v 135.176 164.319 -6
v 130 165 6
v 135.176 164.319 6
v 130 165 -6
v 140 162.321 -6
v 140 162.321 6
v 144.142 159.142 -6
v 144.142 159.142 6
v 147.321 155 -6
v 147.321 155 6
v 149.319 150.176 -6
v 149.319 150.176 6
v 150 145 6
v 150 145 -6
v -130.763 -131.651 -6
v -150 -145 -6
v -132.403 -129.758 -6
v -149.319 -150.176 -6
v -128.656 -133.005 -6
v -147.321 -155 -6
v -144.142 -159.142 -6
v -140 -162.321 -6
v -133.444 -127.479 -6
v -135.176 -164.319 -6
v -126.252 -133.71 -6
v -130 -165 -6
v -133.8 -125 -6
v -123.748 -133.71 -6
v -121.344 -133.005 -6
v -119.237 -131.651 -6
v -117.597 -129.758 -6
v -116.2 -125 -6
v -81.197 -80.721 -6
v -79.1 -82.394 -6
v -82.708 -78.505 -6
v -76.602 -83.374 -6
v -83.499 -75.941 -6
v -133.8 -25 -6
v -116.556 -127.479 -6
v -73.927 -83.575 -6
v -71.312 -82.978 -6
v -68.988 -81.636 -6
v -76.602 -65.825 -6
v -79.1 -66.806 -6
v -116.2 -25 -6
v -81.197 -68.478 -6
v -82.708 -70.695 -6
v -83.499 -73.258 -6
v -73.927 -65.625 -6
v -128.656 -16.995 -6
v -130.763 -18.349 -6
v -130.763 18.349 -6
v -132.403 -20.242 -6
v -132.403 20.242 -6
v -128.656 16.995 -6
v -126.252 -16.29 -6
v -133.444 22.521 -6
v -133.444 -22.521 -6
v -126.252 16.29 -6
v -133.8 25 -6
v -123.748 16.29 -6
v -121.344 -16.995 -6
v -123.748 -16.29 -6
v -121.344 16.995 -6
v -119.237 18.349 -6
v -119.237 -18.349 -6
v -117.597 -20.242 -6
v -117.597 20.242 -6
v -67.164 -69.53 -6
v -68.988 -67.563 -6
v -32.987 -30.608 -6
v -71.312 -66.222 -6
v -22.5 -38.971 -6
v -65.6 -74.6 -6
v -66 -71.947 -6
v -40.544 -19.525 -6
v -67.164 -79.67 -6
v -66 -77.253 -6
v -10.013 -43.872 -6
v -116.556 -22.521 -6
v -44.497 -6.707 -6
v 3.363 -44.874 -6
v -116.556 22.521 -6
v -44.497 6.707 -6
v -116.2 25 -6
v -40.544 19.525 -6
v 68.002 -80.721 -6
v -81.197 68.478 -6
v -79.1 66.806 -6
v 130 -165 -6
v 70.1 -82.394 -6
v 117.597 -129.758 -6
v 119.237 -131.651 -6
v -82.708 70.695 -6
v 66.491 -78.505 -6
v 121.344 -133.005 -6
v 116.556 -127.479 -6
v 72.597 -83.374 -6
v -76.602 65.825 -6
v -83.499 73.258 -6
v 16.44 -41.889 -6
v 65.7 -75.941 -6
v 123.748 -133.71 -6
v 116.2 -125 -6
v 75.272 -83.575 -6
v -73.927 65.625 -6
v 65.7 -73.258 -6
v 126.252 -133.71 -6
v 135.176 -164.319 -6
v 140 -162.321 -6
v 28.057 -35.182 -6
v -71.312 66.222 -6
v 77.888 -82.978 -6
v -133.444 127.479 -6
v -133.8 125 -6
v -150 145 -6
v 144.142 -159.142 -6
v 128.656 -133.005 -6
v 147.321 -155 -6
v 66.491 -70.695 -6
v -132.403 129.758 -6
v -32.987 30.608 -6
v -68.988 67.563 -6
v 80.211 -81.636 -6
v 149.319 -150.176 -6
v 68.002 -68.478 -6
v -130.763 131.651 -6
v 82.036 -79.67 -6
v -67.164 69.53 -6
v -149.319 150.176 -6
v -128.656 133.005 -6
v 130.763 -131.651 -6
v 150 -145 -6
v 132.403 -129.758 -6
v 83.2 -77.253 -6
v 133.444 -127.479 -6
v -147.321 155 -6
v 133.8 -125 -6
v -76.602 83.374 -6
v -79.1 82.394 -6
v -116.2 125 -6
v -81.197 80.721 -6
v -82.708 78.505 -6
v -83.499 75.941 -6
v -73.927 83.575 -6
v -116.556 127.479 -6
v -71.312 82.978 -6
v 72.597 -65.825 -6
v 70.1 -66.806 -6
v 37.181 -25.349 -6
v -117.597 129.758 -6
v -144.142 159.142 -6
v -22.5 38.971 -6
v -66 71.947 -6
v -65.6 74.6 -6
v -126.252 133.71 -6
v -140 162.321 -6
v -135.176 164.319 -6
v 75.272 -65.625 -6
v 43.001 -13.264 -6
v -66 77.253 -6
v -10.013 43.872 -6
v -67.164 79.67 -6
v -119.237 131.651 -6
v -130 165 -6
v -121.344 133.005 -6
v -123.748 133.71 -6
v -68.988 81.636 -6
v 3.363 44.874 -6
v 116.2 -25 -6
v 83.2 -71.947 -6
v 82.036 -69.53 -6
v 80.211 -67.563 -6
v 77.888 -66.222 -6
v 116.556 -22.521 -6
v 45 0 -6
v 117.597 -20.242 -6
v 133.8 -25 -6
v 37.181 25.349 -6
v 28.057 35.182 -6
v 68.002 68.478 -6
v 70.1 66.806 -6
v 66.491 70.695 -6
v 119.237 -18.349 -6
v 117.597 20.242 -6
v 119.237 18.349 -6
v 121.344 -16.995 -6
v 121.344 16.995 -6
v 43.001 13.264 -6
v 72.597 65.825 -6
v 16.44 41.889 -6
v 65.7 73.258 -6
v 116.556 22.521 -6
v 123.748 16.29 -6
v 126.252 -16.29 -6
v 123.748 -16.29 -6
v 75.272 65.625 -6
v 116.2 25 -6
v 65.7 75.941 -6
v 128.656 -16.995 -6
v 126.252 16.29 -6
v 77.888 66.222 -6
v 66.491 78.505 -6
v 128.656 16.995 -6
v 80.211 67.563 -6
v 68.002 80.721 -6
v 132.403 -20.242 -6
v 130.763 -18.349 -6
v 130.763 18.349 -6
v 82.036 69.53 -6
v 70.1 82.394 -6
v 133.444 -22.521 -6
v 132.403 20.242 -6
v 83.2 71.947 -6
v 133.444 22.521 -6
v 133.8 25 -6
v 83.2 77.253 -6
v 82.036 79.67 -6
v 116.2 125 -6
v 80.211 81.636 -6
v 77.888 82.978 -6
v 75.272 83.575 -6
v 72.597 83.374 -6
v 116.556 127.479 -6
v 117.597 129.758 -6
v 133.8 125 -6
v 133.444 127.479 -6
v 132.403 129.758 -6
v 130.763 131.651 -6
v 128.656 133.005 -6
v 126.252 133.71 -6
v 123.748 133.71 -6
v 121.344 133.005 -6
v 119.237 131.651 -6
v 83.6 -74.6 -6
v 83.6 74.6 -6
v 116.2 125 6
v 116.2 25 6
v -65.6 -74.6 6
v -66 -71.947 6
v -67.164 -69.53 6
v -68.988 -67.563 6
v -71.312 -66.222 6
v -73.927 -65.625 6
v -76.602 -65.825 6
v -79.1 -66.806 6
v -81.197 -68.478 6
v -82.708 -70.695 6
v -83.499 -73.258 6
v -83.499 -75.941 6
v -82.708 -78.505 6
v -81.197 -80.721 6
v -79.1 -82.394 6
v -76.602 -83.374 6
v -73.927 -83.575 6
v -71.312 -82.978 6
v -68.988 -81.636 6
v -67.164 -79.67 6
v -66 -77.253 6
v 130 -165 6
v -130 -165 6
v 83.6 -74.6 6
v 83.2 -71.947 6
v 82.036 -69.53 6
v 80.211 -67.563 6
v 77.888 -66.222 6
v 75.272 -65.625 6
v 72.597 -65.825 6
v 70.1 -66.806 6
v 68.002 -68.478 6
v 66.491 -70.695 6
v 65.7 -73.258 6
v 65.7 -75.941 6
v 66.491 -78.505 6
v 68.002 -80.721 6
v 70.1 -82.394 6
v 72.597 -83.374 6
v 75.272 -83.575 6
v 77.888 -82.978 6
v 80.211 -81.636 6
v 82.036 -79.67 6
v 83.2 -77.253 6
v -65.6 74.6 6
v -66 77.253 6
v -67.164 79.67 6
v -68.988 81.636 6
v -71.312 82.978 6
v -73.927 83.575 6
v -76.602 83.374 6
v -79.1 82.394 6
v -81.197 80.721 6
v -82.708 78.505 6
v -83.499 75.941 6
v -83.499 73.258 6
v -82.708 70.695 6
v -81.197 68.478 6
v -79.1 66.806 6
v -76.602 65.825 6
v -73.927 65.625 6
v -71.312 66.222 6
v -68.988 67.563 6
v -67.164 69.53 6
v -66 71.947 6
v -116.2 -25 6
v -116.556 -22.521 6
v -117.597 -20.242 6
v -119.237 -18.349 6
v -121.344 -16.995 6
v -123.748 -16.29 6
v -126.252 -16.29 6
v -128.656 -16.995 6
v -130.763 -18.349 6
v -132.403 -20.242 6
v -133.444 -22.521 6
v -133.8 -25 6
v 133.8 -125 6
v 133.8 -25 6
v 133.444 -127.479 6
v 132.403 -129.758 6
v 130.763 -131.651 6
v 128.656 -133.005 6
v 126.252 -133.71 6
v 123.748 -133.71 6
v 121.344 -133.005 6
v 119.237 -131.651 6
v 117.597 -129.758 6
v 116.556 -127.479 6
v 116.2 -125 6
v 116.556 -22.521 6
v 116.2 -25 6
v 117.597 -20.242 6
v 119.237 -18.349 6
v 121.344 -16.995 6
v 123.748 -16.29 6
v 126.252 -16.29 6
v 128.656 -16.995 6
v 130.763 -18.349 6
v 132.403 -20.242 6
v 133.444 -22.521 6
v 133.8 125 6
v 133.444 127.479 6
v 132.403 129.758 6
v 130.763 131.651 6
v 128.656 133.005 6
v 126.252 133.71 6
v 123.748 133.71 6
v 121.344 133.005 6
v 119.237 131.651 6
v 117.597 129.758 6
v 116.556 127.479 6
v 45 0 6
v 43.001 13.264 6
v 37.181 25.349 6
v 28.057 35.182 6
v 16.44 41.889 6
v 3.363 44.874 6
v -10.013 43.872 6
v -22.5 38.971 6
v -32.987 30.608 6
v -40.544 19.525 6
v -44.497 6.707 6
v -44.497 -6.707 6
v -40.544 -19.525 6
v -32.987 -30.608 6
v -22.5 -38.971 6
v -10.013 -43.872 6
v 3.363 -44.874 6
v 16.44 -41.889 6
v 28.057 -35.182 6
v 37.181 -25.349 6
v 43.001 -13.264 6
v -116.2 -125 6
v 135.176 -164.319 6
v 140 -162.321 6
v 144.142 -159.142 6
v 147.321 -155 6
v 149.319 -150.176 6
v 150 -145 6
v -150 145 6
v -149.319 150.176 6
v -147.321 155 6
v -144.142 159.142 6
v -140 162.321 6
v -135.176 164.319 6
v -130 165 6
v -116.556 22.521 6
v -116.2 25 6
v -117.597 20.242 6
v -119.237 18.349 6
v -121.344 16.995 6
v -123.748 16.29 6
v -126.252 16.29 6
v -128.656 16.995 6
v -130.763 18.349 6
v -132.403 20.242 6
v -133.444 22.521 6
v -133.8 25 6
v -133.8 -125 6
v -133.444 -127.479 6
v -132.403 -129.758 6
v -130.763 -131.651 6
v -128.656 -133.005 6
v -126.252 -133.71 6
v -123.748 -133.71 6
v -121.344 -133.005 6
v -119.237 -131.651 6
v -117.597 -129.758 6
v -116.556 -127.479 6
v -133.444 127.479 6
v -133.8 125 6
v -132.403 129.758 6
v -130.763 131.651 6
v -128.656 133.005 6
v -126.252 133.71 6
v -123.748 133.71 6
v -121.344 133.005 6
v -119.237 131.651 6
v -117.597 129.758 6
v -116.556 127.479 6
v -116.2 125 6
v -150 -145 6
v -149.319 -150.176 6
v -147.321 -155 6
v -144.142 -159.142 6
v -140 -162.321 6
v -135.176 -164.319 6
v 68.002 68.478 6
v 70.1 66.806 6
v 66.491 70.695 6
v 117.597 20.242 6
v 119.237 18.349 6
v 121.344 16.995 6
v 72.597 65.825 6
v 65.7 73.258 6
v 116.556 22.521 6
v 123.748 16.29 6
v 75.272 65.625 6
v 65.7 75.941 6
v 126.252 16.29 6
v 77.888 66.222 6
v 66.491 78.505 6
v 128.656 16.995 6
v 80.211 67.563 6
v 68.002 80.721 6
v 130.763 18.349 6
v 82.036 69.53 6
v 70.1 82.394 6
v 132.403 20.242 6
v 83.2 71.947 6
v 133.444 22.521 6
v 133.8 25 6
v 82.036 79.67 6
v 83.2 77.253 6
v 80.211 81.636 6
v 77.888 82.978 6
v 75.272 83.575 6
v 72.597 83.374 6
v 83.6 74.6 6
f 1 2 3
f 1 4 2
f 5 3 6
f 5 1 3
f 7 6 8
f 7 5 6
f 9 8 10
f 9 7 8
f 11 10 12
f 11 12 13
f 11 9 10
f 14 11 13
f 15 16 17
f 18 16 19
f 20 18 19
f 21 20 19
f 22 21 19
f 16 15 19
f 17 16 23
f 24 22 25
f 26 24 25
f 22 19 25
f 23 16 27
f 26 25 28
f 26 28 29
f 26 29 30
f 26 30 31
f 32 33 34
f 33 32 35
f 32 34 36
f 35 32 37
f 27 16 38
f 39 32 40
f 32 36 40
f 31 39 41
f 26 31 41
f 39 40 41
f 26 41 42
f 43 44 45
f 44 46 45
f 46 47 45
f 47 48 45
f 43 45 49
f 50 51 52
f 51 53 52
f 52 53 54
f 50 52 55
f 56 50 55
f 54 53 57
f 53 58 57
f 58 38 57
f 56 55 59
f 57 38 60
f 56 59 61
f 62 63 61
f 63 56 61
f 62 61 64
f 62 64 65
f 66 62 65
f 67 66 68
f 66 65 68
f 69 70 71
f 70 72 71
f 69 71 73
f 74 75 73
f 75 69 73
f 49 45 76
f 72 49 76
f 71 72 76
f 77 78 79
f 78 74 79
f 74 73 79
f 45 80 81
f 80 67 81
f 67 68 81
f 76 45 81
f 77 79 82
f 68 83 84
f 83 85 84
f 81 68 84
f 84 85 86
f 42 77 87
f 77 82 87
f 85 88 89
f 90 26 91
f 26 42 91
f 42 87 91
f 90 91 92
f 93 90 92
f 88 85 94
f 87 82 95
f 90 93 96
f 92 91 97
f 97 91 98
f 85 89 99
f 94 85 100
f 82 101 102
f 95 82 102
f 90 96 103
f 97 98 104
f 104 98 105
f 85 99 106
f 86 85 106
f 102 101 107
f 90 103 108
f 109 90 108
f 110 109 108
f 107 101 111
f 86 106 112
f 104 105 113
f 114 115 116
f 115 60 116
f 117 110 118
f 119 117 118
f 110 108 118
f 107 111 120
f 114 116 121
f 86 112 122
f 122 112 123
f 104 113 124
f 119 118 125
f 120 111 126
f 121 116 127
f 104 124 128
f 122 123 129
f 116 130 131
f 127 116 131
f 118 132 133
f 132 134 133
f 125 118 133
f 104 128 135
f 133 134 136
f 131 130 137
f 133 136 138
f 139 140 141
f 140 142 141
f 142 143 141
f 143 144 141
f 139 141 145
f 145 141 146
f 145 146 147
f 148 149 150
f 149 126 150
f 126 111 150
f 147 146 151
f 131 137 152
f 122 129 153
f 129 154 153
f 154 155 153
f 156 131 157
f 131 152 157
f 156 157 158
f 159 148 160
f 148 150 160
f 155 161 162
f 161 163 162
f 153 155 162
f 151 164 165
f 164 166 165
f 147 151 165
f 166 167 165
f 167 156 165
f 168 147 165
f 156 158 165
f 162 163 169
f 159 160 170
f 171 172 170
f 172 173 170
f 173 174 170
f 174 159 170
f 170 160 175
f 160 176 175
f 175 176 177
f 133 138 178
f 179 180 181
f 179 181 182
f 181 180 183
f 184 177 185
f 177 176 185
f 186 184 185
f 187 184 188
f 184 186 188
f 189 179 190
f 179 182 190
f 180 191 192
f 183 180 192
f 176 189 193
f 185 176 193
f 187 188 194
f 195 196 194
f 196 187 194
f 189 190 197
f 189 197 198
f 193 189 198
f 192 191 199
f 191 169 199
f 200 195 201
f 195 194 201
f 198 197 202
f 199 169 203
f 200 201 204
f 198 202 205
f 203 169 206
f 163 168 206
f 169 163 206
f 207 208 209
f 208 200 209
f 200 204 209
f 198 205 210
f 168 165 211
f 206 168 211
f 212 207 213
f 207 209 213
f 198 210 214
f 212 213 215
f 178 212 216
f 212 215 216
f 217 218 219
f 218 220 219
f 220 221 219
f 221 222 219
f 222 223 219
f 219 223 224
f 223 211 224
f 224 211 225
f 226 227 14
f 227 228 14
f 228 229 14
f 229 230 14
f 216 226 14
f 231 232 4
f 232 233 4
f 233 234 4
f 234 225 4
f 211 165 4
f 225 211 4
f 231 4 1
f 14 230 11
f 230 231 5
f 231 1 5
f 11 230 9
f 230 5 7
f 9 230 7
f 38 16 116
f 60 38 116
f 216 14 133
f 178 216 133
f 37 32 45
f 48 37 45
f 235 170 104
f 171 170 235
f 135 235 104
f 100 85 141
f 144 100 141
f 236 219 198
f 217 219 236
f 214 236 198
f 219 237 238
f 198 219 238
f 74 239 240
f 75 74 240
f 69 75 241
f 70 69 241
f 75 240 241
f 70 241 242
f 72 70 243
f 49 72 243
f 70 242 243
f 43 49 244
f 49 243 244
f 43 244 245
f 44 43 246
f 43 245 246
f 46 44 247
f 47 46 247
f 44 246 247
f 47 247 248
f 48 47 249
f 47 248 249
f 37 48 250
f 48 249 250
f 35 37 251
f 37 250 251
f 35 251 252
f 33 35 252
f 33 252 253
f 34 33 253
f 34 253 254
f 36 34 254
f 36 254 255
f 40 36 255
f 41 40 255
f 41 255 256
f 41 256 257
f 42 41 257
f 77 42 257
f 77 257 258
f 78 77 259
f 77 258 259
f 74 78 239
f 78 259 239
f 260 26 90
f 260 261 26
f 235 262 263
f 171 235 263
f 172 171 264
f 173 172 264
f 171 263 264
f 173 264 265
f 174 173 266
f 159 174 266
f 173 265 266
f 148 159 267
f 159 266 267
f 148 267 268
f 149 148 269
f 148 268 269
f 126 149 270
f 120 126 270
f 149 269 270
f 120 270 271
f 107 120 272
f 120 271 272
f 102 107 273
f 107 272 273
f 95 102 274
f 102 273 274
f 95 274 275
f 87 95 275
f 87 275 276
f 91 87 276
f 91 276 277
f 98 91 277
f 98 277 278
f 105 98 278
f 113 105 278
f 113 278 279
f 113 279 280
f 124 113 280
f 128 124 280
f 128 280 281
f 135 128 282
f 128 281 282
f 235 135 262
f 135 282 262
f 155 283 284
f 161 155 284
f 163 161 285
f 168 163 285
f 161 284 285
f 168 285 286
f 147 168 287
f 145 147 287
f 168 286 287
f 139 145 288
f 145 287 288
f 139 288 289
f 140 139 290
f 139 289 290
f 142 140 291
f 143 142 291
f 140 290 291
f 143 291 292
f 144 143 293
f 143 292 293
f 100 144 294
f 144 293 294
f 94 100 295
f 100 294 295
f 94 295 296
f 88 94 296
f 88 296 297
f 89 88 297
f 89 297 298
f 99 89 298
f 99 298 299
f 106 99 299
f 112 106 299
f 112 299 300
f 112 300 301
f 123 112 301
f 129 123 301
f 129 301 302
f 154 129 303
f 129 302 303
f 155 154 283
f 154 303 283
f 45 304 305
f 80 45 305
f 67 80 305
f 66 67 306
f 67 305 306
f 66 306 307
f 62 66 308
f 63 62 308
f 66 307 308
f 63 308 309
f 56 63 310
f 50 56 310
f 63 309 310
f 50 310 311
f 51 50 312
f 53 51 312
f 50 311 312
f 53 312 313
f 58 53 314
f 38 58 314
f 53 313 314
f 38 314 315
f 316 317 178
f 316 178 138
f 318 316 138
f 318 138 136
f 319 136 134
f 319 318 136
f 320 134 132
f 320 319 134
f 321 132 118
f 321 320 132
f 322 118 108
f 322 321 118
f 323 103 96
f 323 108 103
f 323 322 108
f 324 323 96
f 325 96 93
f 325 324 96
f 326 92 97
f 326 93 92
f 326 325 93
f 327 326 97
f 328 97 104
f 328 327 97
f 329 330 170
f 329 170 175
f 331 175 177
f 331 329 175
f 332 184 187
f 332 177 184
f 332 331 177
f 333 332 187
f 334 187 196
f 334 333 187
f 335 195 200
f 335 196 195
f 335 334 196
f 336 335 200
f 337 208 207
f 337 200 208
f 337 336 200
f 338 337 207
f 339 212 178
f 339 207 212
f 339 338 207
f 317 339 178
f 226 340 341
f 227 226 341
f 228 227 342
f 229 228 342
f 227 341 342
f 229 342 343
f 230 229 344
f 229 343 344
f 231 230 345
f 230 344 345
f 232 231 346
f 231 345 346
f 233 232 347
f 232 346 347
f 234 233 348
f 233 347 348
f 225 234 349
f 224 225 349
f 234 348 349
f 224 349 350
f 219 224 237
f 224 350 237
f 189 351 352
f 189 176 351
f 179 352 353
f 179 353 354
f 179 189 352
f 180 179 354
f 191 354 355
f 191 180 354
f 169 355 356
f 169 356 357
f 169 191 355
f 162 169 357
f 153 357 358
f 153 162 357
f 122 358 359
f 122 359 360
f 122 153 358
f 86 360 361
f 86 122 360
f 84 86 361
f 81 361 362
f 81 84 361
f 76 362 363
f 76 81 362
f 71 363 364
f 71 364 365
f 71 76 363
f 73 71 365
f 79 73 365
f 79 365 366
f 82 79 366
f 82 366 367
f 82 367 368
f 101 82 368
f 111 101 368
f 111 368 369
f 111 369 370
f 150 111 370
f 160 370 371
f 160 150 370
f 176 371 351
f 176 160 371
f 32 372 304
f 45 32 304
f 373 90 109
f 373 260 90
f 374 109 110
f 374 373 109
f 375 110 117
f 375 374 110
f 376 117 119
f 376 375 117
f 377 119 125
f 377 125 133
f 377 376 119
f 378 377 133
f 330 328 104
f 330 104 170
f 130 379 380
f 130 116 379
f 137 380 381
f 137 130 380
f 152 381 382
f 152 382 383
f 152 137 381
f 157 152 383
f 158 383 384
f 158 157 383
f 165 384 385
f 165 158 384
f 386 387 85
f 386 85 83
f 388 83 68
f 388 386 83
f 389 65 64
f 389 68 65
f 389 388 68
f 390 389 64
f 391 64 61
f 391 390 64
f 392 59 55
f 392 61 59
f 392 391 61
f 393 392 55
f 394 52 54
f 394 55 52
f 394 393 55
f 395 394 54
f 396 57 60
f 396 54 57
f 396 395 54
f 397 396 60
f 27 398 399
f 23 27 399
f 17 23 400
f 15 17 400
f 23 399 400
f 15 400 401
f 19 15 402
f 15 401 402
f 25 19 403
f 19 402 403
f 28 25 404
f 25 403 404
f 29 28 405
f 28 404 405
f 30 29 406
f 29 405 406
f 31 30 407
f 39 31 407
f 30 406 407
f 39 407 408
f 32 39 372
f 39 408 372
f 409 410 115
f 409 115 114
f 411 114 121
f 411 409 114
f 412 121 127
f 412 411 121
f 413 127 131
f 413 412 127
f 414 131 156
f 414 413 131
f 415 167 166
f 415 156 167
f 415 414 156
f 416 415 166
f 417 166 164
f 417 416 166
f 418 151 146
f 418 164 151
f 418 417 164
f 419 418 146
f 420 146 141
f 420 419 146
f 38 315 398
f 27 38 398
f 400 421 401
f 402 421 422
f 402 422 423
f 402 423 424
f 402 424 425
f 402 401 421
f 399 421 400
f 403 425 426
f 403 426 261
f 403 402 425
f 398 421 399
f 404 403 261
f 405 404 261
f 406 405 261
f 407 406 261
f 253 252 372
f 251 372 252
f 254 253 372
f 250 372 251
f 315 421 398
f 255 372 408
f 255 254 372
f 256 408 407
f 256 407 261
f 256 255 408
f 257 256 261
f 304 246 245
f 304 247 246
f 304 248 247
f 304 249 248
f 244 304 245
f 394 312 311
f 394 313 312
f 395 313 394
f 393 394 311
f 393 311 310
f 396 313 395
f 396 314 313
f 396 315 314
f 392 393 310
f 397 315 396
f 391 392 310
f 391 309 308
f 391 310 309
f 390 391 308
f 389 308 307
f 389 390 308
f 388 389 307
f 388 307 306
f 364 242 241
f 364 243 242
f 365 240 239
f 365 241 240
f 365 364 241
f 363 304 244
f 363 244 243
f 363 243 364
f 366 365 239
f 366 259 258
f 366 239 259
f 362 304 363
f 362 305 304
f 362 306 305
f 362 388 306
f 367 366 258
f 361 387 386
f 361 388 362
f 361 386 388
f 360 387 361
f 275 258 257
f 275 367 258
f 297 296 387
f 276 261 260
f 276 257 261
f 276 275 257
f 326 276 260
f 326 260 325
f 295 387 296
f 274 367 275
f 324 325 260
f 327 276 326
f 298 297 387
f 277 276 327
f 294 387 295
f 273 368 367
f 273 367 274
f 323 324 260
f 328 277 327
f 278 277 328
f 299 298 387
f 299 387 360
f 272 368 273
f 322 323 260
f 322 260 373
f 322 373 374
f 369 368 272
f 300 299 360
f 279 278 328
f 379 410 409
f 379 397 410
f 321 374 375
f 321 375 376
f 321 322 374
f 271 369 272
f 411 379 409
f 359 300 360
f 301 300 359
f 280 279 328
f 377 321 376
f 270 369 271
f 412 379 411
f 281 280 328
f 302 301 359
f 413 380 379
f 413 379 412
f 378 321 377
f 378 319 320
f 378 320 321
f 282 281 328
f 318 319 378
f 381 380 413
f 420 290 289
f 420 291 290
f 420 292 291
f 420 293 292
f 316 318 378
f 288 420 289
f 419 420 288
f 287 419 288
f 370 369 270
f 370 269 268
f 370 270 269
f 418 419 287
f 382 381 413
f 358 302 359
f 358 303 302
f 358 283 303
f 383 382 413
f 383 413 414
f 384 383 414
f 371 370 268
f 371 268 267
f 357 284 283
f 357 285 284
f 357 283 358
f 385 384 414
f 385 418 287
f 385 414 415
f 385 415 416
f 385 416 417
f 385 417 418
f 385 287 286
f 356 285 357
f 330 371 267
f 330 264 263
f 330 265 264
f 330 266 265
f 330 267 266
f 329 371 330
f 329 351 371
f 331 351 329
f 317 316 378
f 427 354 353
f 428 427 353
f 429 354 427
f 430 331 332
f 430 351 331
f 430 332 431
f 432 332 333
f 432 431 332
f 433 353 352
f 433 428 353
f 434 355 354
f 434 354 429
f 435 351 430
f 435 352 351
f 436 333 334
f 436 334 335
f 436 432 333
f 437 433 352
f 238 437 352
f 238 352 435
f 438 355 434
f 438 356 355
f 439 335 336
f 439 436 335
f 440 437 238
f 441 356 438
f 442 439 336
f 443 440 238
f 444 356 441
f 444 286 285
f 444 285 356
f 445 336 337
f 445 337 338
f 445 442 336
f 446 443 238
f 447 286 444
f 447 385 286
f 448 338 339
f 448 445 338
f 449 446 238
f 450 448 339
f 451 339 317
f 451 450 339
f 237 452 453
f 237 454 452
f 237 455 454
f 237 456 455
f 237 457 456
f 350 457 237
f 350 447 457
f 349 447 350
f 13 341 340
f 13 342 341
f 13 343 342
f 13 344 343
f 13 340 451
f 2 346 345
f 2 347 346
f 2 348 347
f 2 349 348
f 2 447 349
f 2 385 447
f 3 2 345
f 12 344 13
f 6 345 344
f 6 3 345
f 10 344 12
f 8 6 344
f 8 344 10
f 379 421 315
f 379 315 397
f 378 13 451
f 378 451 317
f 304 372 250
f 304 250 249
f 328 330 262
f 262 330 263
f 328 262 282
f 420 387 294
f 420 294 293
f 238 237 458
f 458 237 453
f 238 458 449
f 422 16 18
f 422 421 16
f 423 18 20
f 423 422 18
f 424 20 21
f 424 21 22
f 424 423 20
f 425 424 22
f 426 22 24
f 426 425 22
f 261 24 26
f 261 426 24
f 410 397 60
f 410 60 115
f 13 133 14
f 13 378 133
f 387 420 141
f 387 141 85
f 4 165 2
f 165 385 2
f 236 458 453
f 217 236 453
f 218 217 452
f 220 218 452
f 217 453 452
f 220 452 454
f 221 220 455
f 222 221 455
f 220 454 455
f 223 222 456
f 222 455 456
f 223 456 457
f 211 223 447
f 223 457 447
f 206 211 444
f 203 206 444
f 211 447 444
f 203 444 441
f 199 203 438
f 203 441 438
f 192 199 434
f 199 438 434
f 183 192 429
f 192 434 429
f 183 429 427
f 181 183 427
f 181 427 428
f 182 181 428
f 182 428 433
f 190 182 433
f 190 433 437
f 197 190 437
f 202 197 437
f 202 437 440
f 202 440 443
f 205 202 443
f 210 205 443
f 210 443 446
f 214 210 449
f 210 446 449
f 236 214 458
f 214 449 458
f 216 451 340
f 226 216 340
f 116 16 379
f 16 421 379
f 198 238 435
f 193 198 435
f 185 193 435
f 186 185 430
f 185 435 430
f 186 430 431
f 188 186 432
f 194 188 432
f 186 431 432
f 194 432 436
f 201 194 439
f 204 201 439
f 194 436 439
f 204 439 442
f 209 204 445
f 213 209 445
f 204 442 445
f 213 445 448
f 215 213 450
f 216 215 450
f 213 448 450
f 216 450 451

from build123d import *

# Parameters (mm, degrees)
SKETCH_1_W          = 300
SKETCH_1_H          = 330
SKETCH_1_R          = 45
EXTRUDE_1_DEPTH     = 6
CUT_EXTRUDE_1_DEPTH = 224.313680727
FILLET_1_R          = 20
SKETCH_3_R          = 9
CUT_EXTRUDE_2_DEPTH = 12


with BuildPart() as part:
    # Эскиз1 → Бобышка-Вытянуть1 (new, symmetric)
    with BuildSketch(Plane.XY):
        Rectangle(SKETCH_1_W, SKETCH_1_H)
        Circle(SKETCH_1_R, mode=Mode.SUBTRACT)
    extrude(amount=EXTRUDE_1_DEPTH, both=True)

    # Эскиз2 → Вырез-Вытянуть1 (cut, through all)
    with BuildSketch(Plane.XY.offset(6)):
        with BuildLine():
            Line((-116.2, 125), (-116.2, 25))
            ThreePointArc((-116.2, 25), (-125, 16.2), (-133.8, 25))
            Line((-133.8, 25), (-133.8, 125))
            ThreePointArc((-133.8, 125), (-125, 133.8), (-116.2, 125))
        make_face()
        with BuildLine():
            Line((-116.2, -125), (-116.2, -25))
            ThreePointArc((-116.2, -25), (-125, -16.2), (-133.8, -25))
            Line((-133.8, -25), (-133.8, -125))
            ThreePointArc((-133.8, -125), (-125, -133.8), (-116.2, -125))
        make_face()
        with BuildLine():
            Line((116.2, -125), (116.2, -25))
            ThreePointArc((116.2, -25), (125, -16.2), (133.8, -25))
            Line((133.8, -25), (133.8, -125))
            ThreePointArc((133.8, -125), (125, -133.8), (116.2, -125))
        make_face()
        with BuildLine():
            Line((116.2, 125), (116.2, 25))
            ThreePointArc((116.2, 25), (125, 16.2), (133.8, 25))
            Line((133.8, 25), (133.8, 125))
            ThreePointArc((133.8, 125), (125, 133.8), (116.2, 125))
        make_face()
    extrude(amount=-CUT_EXTRUDE_1_DEPTH, mode=Mode.SUBTRACT)

    # Скругление1
    fillet_1_edges = [part.edges().sort_by_distance(p)[0] for p in [
        (150, -165, 0),
        (-150, -165, 0),
        (-150, 165, 0),
        (150, 165, 0),
    ]]
    fillet(fillet_1_edges, radius=FILLET_1_R)

    # Эскиз3 → Вырез-Вытянуть2 (cut)
    with BuildSketch(Plane.XY.offset(6)):
        with Locations((-74.599765415, 74.599765415)):
            Circle(SKETCH_3_R)
        with Locations((74.599765415, 74.599765415)):
            Circle(SKETCH_3_R)
        with Locations((74.599765415, -74.599765415)):
            Circle(SKETCH_3_R)
        with Locations((-74.599765415, -74.599765415)):
            Circle(SKETCH_3_R)
    extrude(amount=-CUT_EXTRUDE_2_DEPTH, mode=Mode.SUBTRACT)


solid = part.part
